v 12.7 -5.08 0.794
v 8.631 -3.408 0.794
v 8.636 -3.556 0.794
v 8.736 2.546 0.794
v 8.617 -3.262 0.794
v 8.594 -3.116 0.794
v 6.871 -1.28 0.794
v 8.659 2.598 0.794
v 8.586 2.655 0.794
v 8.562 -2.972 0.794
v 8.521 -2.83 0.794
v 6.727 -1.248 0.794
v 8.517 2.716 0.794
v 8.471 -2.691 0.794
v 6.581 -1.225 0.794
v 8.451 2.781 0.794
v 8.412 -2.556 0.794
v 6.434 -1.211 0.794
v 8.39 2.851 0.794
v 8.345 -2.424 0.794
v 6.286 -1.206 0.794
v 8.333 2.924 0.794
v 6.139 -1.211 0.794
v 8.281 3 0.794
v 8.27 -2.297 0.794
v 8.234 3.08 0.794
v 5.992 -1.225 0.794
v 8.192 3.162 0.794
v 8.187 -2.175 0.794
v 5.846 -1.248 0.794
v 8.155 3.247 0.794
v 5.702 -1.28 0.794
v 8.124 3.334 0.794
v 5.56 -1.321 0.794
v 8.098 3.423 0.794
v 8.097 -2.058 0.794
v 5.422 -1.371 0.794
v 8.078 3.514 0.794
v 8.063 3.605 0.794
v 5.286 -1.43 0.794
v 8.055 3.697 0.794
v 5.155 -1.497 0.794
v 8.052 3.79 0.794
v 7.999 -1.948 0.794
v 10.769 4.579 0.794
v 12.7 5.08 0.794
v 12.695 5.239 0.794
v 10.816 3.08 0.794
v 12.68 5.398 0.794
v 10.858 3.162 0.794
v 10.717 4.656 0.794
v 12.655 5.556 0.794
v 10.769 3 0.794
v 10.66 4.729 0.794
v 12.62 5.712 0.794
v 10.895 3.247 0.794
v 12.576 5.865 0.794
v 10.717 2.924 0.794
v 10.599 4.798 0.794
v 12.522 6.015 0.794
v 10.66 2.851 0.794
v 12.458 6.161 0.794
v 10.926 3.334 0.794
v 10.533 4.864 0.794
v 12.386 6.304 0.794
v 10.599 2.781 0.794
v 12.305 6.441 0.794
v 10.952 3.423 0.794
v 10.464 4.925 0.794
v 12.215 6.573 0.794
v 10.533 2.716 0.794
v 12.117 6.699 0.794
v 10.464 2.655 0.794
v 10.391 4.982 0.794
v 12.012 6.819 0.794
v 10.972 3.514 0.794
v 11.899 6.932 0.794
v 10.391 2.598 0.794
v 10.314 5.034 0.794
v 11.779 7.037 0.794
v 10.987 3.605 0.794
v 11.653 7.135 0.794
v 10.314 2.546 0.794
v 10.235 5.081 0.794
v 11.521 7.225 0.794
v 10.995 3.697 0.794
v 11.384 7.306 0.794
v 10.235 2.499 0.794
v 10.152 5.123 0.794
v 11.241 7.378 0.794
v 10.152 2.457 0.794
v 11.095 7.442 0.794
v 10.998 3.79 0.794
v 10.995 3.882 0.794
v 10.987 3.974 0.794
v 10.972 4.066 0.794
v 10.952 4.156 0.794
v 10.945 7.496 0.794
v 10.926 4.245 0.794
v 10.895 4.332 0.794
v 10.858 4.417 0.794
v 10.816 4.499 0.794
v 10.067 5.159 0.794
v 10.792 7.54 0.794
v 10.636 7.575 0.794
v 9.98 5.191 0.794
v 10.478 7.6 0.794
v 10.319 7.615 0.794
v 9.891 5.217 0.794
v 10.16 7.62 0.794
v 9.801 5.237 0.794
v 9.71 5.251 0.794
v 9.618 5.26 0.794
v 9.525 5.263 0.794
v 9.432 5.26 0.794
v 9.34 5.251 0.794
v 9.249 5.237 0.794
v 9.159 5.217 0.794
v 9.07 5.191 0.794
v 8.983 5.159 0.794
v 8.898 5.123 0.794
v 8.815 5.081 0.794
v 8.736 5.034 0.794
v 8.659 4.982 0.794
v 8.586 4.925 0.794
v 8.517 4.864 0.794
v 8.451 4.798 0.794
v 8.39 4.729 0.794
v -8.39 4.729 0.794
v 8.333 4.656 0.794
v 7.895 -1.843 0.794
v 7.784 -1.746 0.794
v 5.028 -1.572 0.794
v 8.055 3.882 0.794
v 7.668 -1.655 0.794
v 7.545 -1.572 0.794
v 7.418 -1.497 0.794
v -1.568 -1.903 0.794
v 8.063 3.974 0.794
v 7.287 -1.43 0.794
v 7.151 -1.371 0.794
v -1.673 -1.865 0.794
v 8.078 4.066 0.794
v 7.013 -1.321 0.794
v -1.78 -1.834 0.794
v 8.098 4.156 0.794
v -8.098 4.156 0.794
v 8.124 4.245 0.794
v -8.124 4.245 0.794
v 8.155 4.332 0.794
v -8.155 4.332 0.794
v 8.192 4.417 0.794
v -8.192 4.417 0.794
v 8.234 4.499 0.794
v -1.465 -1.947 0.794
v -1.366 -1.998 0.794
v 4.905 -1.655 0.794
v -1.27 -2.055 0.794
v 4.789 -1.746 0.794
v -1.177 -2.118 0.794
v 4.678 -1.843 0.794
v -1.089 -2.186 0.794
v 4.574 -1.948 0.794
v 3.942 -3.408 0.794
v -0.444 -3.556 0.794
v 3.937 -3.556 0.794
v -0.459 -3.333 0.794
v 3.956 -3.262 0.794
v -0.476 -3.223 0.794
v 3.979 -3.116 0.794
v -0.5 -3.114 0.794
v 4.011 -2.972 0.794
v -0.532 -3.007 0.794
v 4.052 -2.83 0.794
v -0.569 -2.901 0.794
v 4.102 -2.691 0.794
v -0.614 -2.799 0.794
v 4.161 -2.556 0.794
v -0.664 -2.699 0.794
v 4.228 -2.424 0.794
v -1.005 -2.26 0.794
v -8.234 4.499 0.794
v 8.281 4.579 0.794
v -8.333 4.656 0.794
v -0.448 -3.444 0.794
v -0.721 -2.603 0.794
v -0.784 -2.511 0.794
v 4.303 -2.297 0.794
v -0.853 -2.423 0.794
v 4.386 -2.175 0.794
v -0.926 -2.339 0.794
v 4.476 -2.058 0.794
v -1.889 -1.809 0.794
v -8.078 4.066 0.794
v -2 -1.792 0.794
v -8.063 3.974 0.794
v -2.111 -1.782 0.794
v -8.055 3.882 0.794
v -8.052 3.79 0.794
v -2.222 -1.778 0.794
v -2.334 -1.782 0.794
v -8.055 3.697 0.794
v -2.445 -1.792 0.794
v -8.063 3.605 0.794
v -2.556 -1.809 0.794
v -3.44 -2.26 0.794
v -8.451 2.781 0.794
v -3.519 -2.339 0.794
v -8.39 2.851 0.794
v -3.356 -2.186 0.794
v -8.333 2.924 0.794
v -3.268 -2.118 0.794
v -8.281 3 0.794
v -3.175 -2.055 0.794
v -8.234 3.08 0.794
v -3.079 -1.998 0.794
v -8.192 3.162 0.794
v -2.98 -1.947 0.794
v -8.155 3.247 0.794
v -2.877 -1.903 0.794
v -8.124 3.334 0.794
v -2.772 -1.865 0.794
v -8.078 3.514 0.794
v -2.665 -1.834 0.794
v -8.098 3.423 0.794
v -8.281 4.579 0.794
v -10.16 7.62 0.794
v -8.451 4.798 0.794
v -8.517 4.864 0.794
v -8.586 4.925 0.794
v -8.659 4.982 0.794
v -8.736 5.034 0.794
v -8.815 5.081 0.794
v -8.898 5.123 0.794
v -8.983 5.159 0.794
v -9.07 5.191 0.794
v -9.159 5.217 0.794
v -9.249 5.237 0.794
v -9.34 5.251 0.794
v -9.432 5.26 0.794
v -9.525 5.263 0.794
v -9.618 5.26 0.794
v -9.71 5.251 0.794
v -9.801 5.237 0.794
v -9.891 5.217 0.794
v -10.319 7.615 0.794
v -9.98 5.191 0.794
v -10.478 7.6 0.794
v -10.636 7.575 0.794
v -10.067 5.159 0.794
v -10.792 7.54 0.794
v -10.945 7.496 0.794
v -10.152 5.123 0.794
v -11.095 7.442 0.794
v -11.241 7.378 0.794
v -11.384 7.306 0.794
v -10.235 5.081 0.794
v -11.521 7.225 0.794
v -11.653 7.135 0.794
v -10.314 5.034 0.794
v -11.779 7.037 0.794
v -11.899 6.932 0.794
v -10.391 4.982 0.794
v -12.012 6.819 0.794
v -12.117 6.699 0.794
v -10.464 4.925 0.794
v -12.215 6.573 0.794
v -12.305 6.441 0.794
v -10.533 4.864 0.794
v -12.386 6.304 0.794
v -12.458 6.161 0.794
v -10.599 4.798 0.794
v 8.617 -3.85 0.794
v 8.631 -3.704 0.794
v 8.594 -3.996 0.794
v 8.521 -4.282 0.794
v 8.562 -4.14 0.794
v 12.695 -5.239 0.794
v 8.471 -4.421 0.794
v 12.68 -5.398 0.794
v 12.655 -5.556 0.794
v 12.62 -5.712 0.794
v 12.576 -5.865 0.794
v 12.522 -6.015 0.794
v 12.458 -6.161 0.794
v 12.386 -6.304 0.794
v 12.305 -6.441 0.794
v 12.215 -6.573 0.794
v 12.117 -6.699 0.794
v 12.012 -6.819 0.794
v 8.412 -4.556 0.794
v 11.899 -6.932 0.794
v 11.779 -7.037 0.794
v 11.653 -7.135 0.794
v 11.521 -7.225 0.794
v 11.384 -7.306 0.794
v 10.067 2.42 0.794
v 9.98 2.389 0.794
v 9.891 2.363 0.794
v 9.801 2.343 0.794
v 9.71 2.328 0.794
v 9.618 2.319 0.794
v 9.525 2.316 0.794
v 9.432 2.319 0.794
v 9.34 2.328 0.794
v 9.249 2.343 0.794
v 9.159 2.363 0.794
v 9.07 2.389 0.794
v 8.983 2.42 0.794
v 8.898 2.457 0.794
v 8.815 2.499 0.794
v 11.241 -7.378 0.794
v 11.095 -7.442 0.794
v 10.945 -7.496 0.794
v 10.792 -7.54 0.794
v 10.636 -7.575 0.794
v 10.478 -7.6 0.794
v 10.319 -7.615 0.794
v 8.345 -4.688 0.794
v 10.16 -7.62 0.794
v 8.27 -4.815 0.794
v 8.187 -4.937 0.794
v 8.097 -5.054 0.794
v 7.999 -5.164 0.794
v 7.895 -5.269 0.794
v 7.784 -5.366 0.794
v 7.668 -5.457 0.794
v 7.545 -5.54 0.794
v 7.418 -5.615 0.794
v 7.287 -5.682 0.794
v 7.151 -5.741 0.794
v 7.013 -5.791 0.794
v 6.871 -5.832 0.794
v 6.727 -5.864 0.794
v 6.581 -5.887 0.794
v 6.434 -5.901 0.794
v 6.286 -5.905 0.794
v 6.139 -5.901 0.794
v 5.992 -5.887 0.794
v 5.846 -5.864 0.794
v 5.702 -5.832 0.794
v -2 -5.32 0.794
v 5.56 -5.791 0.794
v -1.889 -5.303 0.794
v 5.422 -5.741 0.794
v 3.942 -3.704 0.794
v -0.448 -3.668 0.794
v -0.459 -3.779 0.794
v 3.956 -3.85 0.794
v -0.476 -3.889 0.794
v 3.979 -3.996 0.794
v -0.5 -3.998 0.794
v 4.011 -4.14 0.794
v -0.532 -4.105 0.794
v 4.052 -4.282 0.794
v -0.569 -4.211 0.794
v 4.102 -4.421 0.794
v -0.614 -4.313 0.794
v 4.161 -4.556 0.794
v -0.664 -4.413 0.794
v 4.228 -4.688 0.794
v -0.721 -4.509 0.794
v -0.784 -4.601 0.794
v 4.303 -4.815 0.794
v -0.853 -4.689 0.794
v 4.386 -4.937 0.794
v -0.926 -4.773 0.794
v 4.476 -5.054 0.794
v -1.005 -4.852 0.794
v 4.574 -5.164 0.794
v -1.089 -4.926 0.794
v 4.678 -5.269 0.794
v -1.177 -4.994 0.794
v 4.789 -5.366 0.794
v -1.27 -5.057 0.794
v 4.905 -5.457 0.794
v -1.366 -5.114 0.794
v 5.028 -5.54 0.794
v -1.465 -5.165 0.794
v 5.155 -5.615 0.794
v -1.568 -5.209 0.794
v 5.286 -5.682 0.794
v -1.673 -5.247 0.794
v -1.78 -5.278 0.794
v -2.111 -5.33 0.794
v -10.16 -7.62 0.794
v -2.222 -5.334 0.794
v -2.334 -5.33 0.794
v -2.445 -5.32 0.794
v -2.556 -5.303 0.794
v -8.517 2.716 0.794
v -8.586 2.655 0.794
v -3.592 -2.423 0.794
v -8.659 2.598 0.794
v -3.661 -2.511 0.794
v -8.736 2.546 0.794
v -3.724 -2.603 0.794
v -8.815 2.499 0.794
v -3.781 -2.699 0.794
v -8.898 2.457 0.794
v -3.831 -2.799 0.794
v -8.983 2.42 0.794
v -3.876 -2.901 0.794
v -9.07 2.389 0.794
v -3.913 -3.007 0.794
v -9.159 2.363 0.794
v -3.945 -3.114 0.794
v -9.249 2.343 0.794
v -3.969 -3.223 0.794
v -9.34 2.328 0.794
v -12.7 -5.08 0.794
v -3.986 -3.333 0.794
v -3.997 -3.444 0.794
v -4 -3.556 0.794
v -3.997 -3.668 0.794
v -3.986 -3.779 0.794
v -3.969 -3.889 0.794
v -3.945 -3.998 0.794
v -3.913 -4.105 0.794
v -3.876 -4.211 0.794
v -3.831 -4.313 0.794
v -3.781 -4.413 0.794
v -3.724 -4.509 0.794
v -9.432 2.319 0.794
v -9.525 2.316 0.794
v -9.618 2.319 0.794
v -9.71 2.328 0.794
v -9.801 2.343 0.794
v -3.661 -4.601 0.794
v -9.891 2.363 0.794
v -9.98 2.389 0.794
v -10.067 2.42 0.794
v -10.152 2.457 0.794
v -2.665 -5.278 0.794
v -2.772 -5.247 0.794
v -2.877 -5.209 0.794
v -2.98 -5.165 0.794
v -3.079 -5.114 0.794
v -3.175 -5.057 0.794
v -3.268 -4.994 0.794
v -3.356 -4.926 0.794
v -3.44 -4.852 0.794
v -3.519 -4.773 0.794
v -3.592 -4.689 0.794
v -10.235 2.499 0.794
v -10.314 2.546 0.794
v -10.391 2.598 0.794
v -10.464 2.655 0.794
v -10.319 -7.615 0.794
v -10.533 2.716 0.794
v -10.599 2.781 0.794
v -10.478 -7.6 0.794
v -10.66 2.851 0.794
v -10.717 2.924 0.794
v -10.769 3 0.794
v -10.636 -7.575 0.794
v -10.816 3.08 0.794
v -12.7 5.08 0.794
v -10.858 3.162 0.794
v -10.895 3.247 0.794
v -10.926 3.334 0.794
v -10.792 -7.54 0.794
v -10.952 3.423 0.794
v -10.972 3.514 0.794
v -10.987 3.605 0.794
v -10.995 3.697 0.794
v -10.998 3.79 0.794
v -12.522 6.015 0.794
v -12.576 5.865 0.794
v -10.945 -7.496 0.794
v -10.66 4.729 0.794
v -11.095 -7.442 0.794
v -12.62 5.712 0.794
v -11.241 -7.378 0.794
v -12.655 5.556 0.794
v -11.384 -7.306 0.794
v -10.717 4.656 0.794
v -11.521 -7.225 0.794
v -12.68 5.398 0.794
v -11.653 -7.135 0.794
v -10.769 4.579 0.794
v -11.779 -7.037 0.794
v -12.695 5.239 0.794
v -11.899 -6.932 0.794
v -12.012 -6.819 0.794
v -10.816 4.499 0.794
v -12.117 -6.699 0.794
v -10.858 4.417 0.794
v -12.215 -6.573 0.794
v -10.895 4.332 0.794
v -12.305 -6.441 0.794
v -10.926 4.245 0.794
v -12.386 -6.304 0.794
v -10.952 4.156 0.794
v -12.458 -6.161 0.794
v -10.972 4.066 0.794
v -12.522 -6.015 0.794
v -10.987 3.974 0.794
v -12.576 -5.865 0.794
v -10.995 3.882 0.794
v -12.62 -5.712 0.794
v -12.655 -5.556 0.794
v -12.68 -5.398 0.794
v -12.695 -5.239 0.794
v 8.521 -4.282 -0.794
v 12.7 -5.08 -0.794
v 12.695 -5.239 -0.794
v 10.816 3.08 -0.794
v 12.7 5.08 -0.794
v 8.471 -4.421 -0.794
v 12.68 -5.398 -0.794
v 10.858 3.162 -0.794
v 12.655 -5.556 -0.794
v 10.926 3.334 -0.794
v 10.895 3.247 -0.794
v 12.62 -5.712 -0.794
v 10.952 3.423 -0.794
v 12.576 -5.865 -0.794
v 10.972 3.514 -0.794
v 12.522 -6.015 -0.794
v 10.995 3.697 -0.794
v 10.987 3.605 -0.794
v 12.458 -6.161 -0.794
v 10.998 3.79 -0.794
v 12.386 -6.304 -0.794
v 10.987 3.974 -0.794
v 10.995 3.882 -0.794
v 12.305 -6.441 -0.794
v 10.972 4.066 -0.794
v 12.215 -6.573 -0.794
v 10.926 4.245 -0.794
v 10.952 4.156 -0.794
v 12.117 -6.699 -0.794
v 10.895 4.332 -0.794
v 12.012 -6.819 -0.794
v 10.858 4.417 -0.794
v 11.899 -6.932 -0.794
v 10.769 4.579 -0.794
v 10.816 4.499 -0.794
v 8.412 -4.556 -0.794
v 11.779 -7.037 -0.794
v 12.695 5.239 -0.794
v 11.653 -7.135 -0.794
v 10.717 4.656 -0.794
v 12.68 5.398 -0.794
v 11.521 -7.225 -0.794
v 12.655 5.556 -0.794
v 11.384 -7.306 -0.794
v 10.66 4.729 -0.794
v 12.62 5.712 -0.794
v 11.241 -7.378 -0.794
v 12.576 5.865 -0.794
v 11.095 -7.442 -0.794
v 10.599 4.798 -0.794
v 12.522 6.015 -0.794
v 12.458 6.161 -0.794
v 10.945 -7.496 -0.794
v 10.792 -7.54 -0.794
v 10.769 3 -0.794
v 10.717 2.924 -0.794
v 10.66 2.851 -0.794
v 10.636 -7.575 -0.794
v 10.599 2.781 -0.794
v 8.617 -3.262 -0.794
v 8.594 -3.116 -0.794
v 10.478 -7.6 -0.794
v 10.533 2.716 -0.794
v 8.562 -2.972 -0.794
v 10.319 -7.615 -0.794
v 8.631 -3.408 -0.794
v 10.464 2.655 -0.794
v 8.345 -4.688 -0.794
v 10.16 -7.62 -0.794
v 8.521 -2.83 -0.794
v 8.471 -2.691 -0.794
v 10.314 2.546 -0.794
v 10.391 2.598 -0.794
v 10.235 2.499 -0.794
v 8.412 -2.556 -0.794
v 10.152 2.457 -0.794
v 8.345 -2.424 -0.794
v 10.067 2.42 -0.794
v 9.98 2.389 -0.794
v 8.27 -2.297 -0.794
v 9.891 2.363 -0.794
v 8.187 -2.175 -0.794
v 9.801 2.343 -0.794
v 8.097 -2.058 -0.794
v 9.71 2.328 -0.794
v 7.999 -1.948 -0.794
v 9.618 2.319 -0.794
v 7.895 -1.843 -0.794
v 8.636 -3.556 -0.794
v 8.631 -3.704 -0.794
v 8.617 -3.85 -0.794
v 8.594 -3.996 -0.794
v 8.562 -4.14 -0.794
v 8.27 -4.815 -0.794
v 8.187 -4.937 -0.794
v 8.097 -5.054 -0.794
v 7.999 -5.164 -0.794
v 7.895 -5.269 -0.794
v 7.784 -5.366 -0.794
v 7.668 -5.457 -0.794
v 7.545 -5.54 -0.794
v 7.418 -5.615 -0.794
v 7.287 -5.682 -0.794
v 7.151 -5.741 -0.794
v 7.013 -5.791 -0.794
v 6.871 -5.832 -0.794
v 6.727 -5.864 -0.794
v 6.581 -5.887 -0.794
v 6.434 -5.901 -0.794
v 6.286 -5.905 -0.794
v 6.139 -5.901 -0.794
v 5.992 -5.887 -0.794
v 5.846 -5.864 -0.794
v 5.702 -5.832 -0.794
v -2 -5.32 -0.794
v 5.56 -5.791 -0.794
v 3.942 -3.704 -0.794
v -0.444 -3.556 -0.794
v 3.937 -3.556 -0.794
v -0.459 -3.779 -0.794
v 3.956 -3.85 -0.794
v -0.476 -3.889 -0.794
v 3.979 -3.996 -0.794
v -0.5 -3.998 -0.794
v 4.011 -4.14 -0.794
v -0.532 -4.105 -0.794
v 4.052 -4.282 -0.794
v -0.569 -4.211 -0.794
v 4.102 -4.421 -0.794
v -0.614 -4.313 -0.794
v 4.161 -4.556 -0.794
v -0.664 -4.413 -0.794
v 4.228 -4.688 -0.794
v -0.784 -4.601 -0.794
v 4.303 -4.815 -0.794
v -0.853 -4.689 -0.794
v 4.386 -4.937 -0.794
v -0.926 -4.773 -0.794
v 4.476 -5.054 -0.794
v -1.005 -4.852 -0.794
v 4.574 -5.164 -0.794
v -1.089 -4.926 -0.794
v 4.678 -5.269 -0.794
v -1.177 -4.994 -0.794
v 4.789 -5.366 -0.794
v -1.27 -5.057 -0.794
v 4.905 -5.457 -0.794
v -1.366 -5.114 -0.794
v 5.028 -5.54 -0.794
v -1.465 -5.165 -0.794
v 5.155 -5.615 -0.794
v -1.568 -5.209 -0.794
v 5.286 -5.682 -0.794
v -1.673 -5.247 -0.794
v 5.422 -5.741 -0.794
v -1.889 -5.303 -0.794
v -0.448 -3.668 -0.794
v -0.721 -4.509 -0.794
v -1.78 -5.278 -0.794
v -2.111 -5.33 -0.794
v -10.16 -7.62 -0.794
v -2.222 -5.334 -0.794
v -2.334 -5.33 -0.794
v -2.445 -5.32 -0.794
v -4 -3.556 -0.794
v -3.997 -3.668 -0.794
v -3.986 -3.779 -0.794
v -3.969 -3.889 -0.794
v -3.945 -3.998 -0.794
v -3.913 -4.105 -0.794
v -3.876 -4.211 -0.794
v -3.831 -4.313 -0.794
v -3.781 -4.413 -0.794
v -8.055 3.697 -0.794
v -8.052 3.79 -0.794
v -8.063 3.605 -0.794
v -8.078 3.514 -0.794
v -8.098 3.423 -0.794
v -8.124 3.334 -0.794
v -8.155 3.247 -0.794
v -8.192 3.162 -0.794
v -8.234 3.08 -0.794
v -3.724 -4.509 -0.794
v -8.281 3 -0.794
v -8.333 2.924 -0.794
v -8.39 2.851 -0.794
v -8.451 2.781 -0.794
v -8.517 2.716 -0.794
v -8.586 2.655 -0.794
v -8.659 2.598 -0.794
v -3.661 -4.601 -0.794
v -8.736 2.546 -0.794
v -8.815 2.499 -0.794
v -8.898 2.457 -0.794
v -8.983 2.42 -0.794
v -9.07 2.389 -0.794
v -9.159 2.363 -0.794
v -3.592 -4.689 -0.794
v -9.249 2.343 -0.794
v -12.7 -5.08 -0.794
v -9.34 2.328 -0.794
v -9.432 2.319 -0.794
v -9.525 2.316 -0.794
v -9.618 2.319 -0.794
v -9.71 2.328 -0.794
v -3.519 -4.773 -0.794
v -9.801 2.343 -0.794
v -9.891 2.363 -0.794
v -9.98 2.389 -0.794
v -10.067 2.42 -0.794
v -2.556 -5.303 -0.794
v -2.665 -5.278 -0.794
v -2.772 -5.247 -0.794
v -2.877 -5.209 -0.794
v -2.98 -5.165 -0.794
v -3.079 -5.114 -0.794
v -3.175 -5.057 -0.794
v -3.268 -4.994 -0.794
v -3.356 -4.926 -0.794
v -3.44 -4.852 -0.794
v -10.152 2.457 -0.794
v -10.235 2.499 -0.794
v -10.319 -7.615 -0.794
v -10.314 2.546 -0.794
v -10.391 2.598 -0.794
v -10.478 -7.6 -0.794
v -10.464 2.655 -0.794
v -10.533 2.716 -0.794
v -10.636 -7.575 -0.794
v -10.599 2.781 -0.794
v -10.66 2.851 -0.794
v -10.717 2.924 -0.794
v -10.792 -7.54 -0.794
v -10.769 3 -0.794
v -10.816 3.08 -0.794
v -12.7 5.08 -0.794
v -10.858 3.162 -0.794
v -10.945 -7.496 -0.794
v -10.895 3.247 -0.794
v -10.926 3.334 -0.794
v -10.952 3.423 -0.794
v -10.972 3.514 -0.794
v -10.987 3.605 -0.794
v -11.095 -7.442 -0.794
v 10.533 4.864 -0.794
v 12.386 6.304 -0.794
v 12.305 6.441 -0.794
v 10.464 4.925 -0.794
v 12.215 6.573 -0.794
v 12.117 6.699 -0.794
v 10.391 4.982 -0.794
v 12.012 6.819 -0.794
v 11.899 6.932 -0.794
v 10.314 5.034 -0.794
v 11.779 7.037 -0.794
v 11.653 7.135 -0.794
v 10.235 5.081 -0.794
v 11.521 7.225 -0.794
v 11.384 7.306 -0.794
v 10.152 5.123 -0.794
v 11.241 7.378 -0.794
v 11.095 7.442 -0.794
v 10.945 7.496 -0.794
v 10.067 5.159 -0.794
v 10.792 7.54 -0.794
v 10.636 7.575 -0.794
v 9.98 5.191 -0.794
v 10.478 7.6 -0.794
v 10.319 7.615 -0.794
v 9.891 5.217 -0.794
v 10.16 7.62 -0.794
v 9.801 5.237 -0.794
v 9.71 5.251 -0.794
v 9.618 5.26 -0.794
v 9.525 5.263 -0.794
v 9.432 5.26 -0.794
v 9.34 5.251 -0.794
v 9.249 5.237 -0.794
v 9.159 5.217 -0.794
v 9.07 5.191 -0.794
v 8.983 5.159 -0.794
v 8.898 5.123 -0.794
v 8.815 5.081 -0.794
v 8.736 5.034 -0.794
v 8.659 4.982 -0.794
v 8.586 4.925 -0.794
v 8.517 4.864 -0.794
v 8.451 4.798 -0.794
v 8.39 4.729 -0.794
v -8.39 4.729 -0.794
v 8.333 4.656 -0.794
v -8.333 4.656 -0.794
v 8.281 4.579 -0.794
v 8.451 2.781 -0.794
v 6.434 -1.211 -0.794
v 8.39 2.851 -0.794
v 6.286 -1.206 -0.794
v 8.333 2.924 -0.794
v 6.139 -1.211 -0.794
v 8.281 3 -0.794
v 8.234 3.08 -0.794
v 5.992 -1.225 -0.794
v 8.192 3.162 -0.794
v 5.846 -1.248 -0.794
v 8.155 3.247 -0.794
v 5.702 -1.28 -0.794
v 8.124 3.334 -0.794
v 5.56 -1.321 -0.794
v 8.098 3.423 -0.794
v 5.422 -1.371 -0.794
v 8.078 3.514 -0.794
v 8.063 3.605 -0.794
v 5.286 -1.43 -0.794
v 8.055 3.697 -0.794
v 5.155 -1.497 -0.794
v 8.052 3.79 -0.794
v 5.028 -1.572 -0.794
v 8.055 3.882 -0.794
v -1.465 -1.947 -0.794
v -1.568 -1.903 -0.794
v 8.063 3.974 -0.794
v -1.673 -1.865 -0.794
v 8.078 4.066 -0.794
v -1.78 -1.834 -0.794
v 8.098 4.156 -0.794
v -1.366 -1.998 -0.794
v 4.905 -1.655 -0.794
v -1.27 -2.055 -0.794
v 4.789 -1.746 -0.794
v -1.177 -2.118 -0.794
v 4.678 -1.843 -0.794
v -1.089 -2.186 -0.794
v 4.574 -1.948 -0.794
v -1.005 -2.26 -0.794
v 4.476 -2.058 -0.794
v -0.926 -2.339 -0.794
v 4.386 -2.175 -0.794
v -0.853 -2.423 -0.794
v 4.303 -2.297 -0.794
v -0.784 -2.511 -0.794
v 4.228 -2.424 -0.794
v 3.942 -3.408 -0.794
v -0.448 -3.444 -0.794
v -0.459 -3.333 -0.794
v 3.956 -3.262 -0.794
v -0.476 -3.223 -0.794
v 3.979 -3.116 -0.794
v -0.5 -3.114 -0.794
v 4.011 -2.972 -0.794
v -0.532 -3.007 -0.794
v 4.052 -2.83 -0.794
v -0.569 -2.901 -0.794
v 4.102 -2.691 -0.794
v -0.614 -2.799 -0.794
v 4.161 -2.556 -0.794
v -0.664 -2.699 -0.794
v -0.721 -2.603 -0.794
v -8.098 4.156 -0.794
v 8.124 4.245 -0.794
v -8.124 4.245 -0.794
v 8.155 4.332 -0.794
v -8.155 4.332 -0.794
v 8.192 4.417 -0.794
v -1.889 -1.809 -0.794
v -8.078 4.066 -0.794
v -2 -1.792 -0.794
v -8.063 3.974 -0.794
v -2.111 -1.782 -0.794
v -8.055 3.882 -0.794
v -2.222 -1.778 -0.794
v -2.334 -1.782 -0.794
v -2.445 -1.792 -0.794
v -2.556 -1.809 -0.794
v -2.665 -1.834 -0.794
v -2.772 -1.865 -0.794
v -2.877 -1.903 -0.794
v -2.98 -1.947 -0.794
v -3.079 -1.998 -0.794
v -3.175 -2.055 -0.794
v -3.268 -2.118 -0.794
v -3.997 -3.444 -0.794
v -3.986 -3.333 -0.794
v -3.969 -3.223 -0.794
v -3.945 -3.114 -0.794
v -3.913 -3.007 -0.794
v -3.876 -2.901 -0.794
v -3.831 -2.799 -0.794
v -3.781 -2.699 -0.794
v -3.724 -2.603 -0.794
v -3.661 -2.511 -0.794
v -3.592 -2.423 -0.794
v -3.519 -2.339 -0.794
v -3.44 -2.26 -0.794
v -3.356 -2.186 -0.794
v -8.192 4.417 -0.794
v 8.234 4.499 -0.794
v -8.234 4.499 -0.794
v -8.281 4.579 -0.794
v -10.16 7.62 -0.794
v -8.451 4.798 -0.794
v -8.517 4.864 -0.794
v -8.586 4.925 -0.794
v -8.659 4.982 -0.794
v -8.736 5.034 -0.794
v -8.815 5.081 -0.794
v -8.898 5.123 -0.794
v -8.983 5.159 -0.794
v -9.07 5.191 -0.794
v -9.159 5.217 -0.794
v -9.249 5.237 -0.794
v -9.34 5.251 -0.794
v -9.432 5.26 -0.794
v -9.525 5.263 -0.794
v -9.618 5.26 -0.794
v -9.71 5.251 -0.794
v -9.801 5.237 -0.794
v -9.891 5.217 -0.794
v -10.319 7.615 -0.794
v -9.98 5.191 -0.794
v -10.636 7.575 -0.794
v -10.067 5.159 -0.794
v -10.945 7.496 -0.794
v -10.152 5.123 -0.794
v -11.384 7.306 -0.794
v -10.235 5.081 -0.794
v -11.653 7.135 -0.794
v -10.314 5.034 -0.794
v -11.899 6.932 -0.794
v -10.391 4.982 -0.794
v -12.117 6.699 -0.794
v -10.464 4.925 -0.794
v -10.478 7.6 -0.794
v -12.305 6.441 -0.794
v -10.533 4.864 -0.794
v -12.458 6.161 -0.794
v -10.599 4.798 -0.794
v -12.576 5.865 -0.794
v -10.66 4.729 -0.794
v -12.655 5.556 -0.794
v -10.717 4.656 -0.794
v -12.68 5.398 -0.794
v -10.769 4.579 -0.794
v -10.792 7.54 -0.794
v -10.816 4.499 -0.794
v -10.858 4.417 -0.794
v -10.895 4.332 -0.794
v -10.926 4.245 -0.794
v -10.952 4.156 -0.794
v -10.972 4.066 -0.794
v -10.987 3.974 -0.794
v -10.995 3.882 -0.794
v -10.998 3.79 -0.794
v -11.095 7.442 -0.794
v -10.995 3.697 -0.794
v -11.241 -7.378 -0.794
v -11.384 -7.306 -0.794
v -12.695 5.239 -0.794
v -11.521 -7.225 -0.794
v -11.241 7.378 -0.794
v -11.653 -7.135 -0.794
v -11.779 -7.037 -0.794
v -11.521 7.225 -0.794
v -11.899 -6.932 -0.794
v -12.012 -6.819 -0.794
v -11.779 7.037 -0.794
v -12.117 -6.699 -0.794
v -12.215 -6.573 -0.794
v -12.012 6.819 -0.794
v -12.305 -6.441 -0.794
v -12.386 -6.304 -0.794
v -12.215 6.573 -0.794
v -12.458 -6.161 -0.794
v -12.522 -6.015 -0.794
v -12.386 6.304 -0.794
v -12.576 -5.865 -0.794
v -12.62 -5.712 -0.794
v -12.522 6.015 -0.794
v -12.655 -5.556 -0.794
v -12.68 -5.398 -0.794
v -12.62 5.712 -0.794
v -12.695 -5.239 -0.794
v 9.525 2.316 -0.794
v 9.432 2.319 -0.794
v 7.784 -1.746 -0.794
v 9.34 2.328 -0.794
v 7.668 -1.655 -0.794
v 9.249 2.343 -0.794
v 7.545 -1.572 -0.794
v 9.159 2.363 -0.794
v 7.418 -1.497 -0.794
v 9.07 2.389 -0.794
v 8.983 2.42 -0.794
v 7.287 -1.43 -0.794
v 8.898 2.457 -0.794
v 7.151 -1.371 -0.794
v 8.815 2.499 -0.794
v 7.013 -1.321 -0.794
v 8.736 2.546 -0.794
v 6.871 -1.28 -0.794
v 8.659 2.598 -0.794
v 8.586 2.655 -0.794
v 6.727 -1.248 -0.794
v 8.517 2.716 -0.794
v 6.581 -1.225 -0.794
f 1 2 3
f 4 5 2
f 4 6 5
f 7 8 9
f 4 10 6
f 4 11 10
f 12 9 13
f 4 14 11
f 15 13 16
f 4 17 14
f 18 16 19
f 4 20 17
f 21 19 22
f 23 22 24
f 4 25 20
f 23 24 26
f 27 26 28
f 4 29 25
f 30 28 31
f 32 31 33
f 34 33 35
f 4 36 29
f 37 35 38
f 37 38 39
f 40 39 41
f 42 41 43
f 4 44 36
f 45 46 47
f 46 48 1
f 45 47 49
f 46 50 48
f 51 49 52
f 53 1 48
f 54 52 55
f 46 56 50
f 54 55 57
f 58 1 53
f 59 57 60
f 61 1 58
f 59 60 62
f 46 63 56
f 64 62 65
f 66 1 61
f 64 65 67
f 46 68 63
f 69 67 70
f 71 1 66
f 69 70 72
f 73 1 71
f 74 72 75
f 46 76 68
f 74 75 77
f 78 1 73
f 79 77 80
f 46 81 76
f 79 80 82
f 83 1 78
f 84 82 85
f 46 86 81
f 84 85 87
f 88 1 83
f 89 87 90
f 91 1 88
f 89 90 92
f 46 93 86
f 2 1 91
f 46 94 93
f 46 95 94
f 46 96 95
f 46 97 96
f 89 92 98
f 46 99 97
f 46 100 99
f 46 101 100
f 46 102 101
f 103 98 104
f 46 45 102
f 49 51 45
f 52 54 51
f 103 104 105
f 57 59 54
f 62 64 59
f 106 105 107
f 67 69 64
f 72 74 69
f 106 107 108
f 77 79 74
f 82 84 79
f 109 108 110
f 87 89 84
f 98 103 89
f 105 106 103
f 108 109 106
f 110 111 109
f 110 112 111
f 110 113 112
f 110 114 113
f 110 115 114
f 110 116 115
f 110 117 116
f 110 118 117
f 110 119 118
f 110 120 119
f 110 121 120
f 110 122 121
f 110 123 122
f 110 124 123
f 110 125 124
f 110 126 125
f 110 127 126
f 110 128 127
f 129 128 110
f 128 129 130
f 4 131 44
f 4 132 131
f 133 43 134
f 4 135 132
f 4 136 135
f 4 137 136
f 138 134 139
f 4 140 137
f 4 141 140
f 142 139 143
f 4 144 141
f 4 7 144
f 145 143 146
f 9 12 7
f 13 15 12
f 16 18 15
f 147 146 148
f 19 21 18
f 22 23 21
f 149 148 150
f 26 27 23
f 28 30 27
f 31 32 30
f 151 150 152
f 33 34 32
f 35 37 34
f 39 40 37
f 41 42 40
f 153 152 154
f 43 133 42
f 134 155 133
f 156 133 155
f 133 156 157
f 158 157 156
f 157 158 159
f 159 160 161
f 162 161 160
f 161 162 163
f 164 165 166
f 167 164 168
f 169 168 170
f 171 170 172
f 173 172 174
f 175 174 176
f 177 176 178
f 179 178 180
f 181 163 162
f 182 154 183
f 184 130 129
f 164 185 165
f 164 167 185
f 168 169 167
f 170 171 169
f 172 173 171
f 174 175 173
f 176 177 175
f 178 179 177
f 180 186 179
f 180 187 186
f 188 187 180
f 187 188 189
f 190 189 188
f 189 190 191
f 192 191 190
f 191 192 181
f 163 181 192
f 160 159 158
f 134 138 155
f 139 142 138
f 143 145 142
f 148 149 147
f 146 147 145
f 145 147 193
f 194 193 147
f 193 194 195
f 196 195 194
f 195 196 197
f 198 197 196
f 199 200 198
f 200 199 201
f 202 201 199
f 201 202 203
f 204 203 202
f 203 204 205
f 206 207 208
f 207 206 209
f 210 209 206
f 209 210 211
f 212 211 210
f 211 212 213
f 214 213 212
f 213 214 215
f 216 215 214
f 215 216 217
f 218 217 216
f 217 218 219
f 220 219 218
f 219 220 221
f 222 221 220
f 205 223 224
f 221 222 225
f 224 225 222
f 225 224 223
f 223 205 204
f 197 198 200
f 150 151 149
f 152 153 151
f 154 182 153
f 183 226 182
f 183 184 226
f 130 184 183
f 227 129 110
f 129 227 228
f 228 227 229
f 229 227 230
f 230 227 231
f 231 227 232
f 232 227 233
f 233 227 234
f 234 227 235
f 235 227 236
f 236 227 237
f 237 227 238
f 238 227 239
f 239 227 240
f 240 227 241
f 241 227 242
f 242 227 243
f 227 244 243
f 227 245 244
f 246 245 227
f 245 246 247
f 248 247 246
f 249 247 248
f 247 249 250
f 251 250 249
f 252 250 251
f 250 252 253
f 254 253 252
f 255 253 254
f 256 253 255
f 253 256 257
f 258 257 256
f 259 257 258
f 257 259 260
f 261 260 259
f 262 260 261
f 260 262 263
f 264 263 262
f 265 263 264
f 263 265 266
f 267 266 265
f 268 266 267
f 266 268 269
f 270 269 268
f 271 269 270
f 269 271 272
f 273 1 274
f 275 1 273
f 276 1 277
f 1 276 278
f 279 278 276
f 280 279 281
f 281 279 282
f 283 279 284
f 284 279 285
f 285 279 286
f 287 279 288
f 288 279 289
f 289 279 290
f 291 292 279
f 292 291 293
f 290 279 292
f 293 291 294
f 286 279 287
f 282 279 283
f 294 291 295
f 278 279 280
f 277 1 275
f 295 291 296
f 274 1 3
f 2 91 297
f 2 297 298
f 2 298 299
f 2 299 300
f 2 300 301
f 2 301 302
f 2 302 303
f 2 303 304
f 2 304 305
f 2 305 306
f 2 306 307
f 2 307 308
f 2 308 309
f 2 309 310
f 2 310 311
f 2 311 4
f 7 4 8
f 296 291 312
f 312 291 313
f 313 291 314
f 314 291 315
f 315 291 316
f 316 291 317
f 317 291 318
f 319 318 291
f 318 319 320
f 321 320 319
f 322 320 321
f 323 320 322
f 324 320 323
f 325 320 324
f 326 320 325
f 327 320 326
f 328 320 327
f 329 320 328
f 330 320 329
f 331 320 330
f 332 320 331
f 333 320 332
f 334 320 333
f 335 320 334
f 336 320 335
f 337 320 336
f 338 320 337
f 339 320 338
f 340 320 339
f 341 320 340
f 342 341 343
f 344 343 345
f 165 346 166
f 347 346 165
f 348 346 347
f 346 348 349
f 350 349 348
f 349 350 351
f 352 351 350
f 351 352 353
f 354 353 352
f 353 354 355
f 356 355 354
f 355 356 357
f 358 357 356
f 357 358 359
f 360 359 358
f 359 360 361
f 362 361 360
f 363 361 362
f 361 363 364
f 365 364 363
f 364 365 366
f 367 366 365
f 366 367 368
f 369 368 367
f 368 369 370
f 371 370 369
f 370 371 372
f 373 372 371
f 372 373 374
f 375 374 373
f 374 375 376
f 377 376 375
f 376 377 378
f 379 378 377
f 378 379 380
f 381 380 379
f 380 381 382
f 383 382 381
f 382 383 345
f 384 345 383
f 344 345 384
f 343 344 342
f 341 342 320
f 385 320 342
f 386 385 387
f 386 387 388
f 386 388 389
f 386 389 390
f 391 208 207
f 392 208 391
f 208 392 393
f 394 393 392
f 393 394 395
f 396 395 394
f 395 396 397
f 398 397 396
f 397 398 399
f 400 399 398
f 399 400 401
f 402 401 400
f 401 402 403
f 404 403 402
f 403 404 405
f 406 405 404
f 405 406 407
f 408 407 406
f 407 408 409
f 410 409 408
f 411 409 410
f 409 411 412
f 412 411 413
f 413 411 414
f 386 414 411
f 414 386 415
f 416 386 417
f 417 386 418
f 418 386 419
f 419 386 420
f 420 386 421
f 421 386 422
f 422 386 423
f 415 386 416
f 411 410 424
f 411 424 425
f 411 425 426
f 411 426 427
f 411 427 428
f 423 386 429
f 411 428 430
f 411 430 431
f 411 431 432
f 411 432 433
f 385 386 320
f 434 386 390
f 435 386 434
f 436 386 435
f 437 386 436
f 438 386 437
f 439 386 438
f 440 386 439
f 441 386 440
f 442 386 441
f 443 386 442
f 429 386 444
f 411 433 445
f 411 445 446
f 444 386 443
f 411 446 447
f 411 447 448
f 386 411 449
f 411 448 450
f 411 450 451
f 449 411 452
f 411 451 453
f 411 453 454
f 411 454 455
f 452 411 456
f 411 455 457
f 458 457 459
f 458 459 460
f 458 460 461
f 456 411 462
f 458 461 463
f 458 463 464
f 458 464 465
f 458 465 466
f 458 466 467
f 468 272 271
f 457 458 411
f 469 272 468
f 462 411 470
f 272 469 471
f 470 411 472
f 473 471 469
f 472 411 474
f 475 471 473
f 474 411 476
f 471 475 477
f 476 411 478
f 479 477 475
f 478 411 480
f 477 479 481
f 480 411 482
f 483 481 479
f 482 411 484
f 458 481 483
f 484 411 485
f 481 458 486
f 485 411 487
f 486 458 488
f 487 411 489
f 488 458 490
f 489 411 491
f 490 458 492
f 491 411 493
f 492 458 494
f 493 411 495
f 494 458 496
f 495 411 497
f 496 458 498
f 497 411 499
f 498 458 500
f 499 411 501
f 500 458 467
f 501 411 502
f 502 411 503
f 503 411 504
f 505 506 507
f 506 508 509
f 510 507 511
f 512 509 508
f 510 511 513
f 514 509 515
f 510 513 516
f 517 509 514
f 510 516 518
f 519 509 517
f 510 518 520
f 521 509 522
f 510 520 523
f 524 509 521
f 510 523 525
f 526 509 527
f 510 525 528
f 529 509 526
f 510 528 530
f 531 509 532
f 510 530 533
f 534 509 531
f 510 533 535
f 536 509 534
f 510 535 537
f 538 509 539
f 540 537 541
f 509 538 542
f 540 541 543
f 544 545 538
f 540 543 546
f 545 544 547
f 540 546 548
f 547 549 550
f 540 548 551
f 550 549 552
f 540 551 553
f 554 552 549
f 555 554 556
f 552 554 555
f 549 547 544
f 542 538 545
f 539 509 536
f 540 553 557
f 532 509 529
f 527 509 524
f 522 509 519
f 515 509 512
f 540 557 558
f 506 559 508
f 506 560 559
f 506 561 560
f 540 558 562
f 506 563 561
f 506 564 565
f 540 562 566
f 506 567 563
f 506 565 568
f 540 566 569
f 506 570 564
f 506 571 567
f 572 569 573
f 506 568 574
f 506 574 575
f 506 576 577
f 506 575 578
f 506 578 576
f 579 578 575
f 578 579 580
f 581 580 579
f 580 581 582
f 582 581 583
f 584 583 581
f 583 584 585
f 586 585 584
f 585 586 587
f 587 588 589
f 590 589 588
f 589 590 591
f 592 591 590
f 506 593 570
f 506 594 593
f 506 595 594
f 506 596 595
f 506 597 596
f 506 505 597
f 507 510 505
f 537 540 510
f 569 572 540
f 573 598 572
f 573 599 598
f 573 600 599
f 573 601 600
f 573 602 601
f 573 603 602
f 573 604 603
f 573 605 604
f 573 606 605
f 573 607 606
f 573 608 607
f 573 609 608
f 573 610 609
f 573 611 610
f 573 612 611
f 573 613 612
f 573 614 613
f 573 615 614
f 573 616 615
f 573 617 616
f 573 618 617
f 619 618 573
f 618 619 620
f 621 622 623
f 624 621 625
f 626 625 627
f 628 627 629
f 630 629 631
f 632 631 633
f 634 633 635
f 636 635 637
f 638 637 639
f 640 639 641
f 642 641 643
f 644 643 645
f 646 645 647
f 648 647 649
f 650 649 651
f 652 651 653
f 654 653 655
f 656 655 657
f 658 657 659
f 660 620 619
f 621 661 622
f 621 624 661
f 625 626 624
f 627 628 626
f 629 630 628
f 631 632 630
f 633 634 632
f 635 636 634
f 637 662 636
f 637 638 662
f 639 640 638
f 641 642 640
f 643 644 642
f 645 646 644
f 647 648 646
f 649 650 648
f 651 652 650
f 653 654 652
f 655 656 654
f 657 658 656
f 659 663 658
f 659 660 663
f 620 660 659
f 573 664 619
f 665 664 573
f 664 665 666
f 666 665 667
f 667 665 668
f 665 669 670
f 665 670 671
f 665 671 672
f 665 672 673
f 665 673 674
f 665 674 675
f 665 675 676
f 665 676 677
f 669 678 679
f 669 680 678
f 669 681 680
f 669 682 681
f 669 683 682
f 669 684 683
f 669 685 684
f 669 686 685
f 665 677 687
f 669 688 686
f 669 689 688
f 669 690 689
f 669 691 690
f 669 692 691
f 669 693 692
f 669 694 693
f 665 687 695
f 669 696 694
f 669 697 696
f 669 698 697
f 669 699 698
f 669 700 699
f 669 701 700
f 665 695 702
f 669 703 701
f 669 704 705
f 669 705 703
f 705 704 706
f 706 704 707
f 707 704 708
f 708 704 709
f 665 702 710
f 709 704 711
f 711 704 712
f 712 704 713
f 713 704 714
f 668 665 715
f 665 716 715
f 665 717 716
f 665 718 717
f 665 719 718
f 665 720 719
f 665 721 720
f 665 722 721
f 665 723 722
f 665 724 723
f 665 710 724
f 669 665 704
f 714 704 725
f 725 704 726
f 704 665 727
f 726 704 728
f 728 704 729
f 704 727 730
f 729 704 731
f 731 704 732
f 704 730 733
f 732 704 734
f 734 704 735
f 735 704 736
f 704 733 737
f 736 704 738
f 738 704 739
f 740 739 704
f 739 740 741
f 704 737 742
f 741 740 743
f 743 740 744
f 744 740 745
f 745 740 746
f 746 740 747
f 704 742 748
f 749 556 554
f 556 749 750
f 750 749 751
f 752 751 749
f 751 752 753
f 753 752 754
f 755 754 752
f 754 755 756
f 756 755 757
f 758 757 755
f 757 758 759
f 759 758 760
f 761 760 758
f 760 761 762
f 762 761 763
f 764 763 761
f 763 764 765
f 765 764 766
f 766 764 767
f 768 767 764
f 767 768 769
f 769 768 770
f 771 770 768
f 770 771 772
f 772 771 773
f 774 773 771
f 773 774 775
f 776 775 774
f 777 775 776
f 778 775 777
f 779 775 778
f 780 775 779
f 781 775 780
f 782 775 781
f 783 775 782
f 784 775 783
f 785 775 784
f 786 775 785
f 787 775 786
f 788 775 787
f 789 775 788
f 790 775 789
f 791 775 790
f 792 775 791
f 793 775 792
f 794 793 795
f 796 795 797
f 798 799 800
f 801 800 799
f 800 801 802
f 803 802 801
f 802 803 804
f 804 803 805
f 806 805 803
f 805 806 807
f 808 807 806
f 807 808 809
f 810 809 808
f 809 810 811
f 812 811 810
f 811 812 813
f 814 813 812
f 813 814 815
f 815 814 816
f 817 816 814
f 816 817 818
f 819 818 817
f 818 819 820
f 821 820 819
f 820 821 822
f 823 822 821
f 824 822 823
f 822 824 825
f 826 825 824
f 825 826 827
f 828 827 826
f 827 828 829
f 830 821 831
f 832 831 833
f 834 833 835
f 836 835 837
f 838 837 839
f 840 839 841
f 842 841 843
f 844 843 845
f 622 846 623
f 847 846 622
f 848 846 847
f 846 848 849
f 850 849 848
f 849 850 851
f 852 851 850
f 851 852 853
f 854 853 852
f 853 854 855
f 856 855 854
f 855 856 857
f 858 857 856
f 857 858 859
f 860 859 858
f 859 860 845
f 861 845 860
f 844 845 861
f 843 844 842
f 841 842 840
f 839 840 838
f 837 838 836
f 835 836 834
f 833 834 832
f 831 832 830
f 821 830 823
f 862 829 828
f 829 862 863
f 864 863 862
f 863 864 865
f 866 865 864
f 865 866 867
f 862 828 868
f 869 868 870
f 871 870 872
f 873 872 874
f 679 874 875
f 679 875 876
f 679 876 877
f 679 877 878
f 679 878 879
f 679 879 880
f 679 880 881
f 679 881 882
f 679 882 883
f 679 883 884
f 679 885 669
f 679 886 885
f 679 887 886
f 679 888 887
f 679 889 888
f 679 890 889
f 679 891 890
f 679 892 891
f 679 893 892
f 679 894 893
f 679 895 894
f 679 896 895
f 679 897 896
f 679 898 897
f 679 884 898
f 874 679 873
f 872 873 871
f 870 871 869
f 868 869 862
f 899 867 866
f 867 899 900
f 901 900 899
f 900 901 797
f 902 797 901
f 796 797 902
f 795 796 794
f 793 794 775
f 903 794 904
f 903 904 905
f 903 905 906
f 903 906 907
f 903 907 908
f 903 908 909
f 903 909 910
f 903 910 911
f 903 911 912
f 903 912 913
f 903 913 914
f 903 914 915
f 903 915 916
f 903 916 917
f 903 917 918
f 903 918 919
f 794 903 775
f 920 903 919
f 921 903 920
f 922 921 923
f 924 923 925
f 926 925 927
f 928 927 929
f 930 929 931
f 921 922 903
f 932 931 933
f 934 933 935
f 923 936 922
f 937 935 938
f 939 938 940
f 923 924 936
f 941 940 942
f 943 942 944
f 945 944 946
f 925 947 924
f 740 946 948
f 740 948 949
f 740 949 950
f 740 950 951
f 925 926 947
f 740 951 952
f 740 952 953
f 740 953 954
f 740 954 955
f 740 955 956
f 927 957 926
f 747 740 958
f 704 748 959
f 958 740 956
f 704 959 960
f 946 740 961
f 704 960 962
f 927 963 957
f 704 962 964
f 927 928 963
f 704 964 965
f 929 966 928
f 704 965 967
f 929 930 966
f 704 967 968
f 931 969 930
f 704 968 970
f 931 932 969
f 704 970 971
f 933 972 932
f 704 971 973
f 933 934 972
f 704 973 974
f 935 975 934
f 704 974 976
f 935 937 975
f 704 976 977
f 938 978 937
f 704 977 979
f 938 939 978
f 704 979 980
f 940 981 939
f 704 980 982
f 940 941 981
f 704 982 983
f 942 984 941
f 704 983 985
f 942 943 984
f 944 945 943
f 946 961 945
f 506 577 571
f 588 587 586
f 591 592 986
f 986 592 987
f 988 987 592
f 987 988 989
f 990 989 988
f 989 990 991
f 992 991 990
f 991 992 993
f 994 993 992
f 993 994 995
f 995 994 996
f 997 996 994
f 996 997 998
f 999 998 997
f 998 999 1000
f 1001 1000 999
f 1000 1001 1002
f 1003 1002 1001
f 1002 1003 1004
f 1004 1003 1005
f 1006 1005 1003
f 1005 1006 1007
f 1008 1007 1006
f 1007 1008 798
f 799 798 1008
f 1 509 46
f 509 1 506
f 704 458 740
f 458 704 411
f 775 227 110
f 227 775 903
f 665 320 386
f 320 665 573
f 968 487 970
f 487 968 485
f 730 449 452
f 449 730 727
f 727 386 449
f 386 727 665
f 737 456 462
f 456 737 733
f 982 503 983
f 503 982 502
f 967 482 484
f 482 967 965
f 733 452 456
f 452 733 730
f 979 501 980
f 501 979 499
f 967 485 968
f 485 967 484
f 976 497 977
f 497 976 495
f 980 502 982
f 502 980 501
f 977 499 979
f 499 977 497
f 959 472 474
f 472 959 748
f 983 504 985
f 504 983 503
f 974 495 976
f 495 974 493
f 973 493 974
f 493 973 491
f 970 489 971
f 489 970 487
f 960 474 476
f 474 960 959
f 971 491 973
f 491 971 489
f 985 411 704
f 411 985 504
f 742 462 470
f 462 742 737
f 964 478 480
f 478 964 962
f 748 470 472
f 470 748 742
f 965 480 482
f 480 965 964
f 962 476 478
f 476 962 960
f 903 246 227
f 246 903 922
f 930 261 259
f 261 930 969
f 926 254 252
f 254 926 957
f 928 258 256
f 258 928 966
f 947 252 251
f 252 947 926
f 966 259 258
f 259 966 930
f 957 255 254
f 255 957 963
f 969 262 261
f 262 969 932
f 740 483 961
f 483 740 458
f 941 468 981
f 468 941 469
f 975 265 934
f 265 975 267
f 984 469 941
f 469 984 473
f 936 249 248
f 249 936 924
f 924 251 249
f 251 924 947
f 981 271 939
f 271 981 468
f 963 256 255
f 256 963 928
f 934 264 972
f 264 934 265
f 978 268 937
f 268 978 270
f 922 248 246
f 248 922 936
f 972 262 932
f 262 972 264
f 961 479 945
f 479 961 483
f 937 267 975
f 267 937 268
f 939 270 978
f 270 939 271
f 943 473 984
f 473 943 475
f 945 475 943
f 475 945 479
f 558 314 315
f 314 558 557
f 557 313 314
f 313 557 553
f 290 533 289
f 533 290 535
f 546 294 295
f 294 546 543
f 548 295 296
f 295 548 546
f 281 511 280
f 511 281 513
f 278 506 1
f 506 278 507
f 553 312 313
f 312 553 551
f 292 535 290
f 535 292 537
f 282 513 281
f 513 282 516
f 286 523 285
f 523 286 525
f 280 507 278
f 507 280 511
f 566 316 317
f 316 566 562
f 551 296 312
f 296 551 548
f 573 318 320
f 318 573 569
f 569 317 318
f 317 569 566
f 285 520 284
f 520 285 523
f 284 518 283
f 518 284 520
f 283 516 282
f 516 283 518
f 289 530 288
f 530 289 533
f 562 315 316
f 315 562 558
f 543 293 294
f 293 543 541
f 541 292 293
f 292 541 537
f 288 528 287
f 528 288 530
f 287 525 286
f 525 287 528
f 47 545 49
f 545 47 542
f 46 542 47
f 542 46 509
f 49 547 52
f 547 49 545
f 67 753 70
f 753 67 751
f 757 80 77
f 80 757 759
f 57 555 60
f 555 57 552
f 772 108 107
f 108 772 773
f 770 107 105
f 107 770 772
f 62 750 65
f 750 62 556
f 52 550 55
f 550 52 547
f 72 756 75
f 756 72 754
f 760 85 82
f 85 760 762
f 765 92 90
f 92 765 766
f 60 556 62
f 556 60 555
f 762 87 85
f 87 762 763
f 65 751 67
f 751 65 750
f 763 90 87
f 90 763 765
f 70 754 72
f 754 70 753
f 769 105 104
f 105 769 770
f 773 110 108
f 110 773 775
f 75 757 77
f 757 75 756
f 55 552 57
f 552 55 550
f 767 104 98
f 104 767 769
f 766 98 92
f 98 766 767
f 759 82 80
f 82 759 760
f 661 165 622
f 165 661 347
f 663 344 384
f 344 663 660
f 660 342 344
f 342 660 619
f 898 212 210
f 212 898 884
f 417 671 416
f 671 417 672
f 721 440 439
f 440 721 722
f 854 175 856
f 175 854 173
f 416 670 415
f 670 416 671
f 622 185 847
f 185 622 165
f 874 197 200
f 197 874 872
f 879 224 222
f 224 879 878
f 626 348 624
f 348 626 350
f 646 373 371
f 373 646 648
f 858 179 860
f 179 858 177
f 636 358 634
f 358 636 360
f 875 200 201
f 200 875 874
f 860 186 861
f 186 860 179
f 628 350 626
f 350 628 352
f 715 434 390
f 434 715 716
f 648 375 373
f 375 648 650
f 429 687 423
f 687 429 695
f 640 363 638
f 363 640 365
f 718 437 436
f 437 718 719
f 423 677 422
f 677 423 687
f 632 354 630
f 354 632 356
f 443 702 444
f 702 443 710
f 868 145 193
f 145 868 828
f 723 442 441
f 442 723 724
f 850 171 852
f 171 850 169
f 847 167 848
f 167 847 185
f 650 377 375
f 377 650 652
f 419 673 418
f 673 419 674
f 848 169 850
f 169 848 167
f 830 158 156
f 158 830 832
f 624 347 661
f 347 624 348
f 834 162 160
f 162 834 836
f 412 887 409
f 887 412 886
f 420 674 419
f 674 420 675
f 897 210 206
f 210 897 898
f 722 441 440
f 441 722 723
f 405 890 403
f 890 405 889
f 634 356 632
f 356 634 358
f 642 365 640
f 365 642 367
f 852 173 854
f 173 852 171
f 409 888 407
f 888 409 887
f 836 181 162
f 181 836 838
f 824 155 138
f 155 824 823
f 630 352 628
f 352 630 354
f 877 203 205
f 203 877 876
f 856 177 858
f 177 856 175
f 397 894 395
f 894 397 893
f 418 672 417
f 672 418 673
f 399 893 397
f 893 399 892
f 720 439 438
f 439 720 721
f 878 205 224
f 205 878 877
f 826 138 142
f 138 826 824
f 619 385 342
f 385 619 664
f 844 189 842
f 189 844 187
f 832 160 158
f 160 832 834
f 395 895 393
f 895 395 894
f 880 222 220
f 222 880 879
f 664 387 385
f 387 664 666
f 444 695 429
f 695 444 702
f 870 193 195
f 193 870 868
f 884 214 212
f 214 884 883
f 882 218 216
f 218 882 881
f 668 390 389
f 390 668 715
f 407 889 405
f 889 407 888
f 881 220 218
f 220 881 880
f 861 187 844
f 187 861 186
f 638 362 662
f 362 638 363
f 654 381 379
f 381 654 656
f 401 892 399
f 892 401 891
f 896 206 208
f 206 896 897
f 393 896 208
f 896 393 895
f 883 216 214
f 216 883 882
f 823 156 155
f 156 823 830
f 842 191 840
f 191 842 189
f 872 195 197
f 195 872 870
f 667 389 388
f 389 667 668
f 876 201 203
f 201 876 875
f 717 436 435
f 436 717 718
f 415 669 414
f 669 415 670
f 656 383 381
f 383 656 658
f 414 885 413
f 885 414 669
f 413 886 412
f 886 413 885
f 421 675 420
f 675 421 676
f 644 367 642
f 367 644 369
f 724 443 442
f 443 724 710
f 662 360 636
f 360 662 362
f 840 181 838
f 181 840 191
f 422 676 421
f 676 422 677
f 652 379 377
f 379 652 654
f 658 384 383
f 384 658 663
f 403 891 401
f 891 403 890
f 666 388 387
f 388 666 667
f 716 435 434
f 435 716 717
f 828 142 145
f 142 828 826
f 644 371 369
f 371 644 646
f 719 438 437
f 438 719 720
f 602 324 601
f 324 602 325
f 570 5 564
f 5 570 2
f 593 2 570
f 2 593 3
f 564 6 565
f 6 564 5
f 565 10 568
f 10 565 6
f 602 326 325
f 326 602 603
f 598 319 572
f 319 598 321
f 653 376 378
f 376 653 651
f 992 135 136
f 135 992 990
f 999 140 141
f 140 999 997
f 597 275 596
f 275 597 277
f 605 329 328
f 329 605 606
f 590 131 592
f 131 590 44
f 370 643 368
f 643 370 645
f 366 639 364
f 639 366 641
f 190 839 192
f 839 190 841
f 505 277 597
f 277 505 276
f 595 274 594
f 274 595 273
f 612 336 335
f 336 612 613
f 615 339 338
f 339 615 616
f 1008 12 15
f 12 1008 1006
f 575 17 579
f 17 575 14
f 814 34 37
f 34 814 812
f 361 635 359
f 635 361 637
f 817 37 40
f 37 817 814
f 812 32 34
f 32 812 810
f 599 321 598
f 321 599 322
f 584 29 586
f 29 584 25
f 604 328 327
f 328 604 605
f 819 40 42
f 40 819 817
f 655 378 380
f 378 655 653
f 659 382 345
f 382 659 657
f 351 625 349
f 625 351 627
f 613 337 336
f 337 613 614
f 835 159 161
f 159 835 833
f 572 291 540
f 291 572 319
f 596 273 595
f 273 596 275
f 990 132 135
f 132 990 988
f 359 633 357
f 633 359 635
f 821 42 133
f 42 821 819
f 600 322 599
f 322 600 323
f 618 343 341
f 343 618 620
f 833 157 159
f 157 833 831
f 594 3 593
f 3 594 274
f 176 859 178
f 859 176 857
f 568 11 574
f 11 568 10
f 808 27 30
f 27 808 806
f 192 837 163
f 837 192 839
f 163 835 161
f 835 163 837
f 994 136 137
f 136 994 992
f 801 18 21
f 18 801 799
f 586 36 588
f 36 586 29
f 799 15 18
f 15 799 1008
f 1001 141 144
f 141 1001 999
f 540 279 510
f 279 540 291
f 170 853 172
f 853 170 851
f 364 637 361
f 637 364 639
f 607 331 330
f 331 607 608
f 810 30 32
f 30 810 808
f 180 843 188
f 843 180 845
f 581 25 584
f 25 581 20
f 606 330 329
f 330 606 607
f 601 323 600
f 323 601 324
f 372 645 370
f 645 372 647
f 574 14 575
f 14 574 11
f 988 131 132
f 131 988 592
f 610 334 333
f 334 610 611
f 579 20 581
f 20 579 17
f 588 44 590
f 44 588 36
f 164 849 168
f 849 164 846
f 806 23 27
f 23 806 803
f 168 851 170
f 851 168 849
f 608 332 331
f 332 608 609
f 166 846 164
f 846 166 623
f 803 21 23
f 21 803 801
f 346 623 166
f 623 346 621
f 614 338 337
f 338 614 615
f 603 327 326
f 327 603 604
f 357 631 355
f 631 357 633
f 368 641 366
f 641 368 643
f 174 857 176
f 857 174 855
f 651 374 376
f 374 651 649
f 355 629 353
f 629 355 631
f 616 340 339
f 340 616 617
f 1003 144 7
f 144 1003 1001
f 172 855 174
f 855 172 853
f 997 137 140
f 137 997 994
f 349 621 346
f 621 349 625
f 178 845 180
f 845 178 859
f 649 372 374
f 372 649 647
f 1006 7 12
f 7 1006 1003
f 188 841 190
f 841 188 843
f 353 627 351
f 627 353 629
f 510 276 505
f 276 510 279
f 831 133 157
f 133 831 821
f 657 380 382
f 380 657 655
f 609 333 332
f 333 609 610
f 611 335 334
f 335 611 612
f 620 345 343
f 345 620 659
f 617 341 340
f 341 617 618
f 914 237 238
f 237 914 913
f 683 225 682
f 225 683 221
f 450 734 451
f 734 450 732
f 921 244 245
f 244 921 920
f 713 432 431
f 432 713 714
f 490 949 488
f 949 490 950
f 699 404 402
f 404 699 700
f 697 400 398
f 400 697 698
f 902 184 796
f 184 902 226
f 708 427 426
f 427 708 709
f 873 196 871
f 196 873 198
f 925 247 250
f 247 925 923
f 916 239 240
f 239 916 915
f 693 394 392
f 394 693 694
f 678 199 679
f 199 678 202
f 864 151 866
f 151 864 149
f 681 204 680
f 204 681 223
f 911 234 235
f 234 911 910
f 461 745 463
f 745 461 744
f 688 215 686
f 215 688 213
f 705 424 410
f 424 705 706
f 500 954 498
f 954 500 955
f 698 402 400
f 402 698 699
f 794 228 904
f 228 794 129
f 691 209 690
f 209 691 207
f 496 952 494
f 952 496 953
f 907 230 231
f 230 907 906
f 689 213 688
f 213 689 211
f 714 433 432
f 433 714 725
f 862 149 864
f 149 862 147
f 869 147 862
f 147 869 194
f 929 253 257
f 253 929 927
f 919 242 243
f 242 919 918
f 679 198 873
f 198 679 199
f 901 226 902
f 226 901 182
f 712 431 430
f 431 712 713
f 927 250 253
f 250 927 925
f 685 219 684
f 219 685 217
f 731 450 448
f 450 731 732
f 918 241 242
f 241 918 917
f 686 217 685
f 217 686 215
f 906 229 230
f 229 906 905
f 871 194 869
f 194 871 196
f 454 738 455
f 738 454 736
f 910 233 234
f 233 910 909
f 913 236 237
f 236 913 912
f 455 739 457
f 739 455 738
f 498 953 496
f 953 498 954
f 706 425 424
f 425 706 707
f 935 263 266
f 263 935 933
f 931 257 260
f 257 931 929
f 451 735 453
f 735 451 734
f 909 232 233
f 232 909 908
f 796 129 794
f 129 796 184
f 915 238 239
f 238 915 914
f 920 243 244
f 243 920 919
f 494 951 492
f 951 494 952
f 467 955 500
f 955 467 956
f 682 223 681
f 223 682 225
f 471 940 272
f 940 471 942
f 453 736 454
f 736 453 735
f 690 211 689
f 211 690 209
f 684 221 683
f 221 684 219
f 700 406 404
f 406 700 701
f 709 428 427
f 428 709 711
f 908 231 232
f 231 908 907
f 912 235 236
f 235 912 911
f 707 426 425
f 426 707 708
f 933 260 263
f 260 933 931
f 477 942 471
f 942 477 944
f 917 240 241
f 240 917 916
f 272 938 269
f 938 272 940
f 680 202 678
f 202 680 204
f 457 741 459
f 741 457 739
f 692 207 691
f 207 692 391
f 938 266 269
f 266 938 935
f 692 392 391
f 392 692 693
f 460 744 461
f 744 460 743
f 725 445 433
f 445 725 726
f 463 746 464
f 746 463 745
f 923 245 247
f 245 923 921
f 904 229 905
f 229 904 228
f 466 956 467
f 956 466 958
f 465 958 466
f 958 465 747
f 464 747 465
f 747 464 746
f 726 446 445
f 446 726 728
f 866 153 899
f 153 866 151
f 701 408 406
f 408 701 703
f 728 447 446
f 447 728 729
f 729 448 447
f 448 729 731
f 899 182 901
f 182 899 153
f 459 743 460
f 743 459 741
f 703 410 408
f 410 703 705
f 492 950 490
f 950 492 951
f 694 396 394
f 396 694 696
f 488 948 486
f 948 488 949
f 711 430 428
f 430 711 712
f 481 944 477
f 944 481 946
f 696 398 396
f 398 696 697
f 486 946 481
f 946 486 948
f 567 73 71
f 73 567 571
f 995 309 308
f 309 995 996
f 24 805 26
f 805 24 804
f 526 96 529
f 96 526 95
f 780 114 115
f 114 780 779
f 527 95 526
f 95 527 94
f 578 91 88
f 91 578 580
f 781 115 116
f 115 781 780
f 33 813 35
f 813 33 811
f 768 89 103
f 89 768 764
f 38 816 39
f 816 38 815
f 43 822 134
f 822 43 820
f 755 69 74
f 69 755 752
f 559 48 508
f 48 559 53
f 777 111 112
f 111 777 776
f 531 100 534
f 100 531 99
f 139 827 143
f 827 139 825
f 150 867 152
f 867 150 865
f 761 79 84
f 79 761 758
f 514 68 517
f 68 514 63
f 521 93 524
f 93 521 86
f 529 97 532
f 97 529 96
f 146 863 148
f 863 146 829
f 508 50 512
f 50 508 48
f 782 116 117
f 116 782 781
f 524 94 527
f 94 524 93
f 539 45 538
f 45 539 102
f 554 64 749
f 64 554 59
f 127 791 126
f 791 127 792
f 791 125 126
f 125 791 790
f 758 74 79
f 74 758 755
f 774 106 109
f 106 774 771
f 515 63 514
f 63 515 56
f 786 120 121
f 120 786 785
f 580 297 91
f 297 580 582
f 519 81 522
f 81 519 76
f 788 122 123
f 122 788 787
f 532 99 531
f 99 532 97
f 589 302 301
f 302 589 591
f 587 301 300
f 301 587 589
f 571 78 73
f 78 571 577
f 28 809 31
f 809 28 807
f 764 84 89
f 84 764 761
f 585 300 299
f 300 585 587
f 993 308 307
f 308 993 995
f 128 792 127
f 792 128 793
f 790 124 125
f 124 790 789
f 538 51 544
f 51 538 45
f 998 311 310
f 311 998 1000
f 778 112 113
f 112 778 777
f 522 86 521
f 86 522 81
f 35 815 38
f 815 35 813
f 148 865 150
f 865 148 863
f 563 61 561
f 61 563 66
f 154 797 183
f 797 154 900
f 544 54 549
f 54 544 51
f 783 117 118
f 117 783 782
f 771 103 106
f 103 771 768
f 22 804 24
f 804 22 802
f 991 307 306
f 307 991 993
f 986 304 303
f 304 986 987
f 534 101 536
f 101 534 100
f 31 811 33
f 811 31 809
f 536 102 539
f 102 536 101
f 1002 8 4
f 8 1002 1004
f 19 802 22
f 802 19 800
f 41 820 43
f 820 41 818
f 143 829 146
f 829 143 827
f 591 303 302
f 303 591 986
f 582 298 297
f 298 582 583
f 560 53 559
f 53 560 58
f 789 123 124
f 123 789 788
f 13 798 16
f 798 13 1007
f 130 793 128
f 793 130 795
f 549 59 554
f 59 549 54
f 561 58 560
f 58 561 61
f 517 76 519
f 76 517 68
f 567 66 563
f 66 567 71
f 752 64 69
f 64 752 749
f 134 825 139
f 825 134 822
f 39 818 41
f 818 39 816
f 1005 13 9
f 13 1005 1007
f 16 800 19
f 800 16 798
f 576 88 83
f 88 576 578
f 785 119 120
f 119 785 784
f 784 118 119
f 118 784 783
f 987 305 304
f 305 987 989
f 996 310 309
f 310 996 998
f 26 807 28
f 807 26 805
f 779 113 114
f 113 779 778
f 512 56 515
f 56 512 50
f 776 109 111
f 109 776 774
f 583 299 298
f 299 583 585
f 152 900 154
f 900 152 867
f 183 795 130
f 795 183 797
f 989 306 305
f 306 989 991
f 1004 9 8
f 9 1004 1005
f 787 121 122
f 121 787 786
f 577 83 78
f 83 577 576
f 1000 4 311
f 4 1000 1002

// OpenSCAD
//====================================================================//
//========================= mount_plate.scad =========================//
//                                                                    //
// Autogenerated using py2scad. Hand editing this file is not         //
// advisable as all modifications will be lost when the program which //
// generated this file is re-run.                                     //
//====================================================================//

$fn = 100;
difference() {
    union() {
        cube(size=[20.32000, 10.16000, 1.58750], center=true);
        translate(v=[10.16000, 0.00000, 0.00000]) {
            cube(size=[5.08000, 10.16000, 1.58750], center=true);
        }
        translate(v=[-10.16000, 0.00000, 0.00000]) {
            cube(size=[5.08000, 10.16000, 1.58750], center=true);
        }
        translate(v=[0.00000, 5.08000, 0.00000]) {
            cube(size=[20.32000, 5.08000, 1.58750], center=true);
        }
        translate(v=[0.00000, -5.08000, 0.00000]) {
            cube(size=[20.32000, 5.08000, 1.58750], center=true);
        }
        translate(v=[-10.16000, -5.08000, 0.00000]) {
            cylinder(h=1.58750,r1=2.54000,r2=2.54000,center=true);
        }
        translate(v=[-10.16000, 5.08000, 0.00000]) {
            cylinder(h=1.58750,r1=2.54000,r2=2.54000,center=true);
        }
        translate(v=[10.16000, -5.08000, 0.00000]) {
            cylinder(h=1.58750,r1=2.54000,r2=2.54000,center=true);
        }
        translate(v=[10.16000, 5.08000, 0.00000]) {
            cylinder(h=1.58750,r1=2.54000,r2=2.54000,center=true);
        }
    }
    translate(v=[-2.22250, -3.55600, 0.00000]) {
        cylinder(h=6.35000,r1=1.77800,r2=1.77800,center=true);
    }
    translate(v=[6.28650, -3.55600, 0.00000]) {
        cylinder(h=6.35000,r1=2.34950,r2=2.34950,center=true);
    }
    translate(v=[-9.52500, 3.78968, 0.00000]) {
        cylinder(h=6.35000,r1=1.47320,r2=1.47320,center=true);
    }
    translate(v=[9.52500, 3.78968, 0.00000]) {
        cylinder(h=6.35000,r1=1.47320,r2=1.47320,center=true);
    }
}
